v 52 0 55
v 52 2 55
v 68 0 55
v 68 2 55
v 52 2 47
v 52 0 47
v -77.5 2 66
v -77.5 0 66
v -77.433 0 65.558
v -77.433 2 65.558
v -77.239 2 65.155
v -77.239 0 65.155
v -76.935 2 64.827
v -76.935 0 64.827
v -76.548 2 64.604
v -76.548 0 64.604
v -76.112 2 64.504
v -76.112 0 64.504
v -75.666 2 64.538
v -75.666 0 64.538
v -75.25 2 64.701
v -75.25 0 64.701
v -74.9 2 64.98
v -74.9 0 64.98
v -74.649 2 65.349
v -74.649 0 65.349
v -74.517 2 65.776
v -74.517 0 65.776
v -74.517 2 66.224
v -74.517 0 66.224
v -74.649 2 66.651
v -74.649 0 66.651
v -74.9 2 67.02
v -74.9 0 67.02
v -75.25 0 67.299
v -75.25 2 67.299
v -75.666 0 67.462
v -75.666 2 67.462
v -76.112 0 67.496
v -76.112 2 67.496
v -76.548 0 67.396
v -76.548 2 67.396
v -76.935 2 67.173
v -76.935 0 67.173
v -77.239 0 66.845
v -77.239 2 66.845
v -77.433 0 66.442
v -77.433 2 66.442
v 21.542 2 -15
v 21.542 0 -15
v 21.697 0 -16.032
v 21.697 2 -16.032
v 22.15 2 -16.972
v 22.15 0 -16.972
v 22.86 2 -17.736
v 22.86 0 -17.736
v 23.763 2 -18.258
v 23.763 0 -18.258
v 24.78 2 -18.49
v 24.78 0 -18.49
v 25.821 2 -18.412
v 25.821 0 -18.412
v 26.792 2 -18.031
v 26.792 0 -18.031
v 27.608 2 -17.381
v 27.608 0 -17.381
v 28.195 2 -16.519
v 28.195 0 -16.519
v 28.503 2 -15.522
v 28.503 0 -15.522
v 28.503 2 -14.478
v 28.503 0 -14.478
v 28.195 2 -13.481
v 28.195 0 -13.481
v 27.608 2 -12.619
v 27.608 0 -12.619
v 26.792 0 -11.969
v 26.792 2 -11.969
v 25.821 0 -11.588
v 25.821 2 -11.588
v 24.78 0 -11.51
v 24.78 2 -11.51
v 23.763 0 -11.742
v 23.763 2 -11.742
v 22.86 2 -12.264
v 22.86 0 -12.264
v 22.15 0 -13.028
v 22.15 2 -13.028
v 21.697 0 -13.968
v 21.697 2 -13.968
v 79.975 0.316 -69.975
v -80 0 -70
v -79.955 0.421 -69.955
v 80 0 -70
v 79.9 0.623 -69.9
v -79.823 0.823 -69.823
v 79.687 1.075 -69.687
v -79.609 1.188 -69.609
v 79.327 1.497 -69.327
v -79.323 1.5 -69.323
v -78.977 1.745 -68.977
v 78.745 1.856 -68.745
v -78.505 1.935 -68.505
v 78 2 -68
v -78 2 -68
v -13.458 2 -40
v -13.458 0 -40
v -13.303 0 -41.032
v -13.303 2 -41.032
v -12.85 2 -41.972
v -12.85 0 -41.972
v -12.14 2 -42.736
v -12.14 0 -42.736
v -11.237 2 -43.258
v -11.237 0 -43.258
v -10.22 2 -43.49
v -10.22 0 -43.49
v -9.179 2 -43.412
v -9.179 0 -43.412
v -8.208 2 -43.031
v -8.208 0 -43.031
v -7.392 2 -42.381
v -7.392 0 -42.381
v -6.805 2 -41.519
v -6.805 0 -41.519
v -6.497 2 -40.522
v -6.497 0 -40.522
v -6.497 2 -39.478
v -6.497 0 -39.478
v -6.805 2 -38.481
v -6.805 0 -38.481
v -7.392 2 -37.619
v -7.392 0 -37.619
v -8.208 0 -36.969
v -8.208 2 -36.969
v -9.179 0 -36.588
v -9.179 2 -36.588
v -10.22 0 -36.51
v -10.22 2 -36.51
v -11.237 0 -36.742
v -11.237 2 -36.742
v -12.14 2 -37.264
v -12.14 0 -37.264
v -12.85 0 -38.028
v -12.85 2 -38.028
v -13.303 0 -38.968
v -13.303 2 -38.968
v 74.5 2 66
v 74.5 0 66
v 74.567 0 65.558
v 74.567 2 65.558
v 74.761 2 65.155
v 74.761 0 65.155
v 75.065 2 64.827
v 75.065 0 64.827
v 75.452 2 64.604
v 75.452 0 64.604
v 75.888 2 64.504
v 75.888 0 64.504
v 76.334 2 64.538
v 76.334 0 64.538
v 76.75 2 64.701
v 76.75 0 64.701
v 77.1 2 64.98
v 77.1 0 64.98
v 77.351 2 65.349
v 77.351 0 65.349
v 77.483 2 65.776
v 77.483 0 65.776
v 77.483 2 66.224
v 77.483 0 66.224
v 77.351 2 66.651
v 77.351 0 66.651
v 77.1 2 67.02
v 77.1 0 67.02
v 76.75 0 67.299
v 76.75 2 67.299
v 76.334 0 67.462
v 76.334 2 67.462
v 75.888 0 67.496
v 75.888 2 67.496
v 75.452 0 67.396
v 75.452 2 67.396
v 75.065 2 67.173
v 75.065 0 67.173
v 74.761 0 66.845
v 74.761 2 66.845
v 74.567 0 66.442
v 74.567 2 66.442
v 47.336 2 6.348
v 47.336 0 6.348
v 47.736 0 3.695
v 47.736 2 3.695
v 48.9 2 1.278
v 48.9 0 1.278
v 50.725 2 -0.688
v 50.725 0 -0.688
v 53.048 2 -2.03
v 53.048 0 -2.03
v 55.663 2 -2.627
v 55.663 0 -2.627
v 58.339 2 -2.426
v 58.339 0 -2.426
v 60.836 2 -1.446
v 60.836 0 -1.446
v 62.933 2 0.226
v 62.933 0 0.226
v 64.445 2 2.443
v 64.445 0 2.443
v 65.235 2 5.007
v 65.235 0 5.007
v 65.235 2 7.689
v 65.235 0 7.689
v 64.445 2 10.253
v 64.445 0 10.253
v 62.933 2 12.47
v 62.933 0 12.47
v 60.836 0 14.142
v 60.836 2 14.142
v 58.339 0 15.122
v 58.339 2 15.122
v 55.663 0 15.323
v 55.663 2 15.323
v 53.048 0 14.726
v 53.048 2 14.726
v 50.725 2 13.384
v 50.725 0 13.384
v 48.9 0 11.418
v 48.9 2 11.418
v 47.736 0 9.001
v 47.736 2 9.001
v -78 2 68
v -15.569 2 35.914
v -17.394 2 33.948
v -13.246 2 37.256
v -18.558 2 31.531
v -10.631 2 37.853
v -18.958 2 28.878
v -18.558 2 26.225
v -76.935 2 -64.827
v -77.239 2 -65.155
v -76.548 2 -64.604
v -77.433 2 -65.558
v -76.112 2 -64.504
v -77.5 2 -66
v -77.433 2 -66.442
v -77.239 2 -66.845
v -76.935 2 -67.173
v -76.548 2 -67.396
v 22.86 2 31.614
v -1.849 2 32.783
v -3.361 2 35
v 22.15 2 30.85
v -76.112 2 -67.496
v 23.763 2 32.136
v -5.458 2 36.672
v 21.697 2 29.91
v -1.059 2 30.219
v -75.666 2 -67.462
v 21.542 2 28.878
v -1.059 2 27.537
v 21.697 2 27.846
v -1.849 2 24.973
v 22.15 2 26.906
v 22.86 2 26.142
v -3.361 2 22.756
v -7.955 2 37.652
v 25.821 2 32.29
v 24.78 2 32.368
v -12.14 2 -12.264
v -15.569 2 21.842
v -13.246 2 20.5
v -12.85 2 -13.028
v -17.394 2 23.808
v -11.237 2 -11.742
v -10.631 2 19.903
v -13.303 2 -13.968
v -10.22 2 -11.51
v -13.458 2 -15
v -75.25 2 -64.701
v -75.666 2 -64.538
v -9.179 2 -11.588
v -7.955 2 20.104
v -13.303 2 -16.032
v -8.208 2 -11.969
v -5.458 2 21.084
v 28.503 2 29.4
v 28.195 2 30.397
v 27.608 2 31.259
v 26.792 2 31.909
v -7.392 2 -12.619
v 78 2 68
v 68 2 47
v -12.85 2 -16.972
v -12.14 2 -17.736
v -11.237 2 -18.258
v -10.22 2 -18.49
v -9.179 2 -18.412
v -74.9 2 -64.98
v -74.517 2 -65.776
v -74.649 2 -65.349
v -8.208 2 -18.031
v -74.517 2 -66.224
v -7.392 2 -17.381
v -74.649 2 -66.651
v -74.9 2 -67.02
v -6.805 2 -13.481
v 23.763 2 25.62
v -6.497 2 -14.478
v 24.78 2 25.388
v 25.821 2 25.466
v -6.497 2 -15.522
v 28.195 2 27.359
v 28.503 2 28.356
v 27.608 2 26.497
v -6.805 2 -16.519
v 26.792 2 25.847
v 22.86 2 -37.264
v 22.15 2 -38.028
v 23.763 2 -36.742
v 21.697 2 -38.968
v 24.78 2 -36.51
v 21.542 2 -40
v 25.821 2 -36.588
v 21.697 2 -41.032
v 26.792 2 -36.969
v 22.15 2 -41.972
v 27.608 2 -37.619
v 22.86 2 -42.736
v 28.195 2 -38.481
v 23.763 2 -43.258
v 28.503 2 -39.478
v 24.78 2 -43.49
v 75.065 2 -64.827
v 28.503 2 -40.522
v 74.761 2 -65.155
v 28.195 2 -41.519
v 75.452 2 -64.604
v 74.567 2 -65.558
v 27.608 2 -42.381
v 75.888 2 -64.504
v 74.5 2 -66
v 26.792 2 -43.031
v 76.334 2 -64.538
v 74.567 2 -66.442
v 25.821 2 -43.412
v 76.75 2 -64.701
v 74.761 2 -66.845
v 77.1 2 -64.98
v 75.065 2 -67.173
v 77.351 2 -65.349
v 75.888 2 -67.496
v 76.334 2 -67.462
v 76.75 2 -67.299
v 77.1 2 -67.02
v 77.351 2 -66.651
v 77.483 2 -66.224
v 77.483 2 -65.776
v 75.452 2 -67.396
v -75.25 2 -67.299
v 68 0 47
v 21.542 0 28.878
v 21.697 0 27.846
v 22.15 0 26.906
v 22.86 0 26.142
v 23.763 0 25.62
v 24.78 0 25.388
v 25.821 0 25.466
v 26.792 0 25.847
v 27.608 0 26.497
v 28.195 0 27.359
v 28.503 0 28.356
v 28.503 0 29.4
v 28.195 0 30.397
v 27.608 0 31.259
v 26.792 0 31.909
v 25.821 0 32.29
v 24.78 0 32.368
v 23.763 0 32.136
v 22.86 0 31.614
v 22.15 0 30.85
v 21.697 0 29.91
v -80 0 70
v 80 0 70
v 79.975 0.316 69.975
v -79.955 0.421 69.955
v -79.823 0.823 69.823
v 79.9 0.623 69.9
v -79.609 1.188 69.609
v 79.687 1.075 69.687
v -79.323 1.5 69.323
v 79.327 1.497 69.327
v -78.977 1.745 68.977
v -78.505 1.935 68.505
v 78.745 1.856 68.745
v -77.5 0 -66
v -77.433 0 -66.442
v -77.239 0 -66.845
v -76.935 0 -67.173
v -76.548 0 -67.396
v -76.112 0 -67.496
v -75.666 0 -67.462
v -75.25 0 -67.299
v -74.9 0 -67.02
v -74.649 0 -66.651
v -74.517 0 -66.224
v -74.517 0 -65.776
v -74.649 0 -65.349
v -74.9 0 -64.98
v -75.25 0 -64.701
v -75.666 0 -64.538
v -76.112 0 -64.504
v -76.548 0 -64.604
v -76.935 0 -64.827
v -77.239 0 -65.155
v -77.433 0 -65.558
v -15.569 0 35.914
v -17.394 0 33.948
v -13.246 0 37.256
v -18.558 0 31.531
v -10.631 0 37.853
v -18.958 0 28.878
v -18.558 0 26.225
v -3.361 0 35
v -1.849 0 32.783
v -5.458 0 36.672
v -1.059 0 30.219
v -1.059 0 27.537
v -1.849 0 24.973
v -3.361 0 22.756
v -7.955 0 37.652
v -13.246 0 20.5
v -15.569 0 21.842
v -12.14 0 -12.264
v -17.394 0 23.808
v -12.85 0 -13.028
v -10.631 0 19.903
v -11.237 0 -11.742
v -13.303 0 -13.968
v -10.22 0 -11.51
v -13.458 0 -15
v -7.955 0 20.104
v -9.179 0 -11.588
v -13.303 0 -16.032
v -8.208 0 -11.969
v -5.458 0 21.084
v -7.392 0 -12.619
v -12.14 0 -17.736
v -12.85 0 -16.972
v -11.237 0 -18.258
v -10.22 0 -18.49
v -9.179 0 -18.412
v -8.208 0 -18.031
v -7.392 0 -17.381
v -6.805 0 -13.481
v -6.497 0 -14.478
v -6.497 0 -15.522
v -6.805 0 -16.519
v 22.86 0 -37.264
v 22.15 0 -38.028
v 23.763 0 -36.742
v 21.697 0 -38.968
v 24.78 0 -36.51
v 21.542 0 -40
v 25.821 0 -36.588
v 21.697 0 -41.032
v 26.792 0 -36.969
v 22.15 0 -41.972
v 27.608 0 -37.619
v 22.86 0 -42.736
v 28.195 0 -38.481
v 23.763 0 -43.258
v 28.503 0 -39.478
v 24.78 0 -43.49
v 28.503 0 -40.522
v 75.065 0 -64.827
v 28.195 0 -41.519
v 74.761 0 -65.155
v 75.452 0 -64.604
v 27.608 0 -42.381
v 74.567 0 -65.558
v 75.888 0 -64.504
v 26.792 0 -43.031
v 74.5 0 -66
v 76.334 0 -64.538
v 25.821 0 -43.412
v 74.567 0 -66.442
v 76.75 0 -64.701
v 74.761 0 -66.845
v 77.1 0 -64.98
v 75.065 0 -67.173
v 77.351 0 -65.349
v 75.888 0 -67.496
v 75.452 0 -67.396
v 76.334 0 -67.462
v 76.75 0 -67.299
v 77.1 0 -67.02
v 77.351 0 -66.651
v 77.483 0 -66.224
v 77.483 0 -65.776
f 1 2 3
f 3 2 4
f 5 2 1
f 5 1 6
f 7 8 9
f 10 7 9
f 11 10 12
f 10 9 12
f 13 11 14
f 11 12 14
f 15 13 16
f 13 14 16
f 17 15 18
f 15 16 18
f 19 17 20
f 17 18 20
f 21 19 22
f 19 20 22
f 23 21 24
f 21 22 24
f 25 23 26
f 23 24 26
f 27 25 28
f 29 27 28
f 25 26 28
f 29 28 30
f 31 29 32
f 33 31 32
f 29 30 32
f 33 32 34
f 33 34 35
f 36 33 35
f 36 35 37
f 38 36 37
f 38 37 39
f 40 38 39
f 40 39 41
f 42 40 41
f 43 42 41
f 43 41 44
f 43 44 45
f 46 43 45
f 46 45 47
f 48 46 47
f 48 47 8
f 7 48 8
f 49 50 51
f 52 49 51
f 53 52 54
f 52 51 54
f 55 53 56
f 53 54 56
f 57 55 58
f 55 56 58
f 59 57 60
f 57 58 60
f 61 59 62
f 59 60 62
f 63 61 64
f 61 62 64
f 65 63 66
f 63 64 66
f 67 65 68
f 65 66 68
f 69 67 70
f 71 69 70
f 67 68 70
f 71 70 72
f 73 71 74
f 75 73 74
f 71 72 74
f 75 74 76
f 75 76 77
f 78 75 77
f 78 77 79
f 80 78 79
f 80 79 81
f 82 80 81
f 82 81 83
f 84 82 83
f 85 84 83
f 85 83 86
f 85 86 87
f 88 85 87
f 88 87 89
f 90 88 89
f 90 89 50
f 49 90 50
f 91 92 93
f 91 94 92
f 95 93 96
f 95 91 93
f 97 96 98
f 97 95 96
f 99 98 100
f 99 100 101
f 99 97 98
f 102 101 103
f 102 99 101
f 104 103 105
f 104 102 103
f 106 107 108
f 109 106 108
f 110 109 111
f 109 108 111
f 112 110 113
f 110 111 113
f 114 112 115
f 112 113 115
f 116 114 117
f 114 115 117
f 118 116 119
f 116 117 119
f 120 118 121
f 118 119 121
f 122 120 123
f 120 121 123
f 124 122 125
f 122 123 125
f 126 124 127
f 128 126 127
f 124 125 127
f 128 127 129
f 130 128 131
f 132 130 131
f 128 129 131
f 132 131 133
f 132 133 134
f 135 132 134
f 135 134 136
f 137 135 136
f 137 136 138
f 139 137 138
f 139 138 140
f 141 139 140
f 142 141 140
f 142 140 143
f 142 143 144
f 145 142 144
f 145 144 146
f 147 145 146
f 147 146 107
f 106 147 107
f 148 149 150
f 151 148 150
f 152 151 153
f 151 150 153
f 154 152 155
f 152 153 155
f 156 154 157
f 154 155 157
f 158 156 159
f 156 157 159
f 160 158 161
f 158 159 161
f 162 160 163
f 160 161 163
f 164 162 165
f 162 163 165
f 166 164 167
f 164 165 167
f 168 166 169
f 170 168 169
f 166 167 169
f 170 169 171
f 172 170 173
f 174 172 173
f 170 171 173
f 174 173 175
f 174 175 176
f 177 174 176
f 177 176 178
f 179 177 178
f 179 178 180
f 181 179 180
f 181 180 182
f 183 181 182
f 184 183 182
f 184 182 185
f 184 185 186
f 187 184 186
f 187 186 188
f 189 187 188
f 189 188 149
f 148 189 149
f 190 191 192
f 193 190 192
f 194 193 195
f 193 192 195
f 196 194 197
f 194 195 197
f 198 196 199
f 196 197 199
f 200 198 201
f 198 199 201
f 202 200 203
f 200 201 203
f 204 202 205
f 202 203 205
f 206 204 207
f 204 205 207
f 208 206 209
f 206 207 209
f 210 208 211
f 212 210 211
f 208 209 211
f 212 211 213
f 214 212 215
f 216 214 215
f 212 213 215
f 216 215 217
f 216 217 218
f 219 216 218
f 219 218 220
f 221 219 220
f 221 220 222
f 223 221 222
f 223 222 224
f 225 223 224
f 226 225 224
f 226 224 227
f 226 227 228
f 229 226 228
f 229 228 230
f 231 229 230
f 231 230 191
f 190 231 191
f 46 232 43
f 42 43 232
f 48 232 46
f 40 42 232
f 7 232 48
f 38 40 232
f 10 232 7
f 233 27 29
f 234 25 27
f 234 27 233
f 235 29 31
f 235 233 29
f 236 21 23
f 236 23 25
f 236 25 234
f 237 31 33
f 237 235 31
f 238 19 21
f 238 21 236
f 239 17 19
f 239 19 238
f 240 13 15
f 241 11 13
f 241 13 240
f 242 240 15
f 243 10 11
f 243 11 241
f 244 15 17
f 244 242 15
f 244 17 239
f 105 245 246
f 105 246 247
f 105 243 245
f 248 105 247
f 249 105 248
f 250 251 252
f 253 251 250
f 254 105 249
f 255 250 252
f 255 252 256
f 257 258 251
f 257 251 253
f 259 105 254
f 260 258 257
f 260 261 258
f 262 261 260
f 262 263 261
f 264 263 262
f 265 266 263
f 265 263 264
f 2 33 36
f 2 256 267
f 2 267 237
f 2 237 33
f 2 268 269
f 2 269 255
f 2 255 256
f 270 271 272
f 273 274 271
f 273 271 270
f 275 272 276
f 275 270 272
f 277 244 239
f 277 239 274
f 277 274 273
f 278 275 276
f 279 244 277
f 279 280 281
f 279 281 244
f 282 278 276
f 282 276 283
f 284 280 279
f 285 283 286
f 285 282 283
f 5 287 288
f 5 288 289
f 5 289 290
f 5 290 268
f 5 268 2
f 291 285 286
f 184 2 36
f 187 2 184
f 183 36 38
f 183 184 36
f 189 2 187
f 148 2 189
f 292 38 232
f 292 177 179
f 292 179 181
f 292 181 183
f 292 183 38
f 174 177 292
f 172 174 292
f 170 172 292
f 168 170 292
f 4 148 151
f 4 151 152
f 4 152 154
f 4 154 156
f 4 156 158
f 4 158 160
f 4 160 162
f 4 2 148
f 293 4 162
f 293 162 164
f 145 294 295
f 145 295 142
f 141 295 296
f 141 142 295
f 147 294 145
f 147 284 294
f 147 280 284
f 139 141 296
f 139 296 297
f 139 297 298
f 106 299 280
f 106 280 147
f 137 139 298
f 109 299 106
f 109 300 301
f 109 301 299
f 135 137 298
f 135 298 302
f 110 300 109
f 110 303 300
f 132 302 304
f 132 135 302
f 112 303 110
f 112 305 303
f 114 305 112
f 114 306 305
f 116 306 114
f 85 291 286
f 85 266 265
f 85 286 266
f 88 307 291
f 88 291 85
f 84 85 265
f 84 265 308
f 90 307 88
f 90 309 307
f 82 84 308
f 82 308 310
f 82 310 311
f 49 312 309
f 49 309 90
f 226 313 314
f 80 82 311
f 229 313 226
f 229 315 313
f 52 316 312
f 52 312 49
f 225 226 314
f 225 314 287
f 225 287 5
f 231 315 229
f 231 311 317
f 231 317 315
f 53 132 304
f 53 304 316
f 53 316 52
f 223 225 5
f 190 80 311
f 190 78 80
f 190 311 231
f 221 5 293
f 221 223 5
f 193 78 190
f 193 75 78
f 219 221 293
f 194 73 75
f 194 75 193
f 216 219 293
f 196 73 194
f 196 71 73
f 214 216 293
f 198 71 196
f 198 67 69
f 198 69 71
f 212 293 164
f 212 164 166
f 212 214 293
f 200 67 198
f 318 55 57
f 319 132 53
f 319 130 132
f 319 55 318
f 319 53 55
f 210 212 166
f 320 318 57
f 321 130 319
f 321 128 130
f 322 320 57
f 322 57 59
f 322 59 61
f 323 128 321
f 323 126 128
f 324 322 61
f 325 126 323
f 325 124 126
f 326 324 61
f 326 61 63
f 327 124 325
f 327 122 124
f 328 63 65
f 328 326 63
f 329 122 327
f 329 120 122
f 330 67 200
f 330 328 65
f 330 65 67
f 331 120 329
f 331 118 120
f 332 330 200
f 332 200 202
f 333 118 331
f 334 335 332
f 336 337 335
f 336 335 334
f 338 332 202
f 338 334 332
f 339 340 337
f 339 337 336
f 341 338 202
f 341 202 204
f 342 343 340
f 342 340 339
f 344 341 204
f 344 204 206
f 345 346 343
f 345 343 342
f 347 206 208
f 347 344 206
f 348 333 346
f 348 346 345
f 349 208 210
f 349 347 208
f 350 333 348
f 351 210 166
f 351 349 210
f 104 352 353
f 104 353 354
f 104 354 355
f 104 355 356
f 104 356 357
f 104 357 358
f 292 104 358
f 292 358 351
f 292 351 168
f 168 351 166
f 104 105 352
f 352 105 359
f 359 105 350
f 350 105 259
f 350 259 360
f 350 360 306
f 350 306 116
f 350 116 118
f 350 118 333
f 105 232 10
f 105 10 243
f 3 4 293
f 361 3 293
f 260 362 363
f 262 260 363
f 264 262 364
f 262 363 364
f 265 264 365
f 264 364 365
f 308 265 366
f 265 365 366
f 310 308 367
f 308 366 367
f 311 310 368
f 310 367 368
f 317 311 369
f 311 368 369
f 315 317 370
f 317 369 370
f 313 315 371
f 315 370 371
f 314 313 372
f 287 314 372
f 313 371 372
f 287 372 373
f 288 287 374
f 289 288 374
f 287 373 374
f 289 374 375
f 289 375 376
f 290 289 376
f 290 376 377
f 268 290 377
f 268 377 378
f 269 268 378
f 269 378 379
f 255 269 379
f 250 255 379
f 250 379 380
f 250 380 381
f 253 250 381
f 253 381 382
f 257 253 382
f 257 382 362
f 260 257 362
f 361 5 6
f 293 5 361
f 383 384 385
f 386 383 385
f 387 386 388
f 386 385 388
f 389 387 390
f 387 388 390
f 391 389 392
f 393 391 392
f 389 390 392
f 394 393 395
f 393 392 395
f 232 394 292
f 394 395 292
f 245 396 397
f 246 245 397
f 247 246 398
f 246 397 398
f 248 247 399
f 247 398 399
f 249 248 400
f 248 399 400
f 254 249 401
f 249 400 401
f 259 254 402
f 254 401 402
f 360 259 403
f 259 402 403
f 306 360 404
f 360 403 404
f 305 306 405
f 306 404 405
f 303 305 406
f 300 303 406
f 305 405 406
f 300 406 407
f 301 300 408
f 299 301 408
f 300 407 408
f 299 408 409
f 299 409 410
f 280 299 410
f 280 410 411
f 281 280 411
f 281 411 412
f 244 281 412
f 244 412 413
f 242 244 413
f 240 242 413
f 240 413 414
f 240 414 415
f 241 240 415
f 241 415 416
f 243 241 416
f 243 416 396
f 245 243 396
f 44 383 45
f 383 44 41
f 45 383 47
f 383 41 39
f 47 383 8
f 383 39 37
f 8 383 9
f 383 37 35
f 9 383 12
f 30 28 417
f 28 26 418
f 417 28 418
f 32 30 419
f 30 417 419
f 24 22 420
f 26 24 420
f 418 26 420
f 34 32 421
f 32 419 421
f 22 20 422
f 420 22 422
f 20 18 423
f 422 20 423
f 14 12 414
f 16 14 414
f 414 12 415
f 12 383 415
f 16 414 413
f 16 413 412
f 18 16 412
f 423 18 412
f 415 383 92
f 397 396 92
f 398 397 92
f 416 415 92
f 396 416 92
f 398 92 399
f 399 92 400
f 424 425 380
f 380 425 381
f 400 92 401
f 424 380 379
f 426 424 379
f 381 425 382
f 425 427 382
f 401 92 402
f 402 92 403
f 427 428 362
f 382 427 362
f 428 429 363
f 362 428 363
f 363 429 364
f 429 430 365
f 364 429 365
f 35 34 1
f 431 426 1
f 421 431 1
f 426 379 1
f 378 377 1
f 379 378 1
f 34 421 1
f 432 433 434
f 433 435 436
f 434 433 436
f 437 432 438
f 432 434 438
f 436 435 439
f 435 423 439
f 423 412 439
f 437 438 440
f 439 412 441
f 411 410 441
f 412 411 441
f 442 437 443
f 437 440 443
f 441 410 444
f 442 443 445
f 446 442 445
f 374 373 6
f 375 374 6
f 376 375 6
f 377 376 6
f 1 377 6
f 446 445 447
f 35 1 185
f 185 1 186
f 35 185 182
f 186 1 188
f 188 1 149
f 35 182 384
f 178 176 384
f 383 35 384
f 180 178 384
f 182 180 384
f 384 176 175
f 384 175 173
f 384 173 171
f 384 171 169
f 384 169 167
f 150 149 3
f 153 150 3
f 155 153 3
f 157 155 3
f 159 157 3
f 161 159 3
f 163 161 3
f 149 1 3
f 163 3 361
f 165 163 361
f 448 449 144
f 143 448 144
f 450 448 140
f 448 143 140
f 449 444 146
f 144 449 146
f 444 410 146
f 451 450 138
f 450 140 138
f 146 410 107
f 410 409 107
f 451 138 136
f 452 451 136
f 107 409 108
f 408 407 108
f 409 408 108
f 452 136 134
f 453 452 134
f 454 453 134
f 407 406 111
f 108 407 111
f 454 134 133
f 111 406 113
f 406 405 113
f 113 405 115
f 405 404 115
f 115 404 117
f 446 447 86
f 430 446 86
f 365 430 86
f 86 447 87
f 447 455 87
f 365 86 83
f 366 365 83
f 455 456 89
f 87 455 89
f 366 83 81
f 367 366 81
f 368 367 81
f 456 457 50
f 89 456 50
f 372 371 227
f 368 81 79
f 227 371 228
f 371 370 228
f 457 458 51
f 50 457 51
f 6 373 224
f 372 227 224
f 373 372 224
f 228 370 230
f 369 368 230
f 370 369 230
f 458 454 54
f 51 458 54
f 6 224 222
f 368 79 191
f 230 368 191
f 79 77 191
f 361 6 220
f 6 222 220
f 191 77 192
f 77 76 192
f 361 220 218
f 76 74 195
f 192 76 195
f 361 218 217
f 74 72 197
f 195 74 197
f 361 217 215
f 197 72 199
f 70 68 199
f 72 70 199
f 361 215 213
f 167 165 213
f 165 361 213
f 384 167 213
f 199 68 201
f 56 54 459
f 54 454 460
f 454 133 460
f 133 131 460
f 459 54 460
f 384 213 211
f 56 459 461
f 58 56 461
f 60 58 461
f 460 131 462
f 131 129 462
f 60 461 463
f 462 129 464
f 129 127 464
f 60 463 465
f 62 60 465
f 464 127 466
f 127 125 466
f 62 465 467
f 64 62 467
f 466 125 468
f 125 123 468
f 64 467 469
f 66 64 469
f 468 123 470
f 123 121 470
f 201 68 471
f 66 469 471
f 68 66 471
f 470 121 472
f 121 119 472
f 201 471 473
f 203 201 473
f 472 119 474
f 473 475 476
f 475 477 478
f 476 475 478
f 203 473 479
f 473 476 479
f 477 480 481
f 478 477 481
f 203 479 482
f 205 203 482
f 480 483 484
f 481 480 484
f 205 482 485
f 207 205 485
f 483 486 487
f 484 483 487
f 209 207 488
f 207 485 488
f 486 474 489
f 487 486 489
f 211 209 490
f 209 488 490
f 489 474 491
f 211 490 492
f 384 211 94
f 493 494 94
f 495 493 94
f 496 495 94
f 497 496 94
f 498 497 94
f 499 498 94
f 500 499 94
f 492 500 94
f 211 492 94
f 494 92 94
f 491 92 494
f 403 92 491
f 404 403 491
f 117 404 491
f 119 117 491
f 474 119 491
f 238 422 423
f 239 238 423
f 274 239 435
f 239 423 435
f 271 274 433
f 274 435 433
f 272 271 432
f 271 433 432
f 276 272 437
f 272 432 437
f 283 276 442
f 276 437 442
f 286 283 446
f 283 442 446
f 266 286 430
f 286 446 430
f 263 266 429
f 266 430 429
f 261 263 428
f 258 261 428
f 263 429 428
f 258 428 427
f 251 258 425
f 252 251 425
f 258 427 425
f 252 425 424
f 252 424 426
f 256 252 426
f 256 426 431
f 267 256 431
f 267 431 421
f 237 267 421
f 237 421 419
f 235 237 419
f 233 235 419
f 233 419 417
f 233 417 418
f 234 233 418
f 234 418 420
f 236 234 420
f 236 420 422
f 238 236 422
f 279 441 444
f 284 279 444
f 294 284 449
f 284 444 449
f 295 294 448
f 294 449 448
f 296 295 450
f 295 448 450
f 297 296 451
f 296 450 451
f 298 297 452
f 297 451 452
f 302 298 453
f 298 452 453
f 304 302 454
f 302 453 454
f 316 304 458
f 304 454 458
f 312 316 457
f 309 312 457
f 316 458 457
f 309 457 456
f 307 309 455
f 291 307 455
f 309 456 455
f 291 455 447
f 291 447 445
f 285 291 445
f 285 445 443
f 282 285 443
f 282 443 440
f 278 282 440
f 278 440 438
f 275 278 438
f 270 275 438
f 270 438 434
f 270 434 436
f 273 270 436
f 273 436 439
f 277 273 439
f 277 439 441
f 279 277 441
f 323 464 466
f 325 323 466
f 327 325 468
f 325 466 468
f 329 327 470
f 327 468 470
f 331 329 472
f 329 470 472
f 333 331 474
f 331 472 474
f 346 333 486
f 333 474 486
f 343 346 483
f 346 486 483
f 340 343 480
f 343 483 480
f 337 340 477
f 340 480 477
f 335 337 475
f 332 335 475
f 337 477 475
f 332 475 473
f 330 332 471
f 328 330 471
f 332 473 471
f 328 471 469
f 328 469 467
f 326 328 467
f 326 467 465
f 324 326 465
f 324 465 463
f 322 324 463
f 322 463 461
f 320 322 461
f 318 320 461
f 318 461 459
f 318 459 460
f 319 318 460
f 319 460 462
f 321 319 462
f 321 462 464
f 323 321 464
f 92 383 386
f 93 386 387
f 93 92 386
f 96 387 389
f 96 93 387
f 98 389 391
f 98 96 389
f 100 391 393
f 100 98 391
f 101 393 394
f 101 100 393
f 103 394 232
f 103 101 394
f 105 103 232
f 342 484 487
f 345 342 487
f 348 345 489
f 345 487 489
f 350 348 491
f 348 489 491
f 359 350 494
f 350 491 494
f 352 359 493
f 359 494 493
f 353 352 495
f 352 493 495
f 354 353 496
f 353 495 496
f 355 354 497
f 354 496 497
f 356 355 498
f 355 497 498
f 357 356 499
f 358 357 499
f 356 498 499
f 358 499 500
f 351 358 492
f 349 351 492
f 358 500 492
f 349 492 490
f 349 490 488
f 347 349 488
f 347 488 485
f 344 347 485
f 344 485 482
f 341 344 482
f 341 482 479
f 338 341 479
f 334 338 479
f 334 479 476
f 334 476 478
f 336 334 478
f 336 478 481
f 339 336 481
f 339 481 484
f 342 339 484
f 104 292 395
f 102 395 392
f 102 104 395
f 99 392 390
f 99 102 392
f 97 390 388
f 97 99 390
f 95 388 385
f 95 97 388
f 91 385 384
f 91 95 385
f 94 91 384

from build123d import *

# Parameters (mm, degrees)
SKETCH1_W             = 160
SKETCH1_H             = 140
BOSS_EXTRUDE1_DEPTH   = 2
F_3_0MM_DOWEL_HOLE1_D = 3
F_1_5MM_DOWEL_HOLE4_D = 18
F_3_0MM_DOWEL_HOLE2_D = 7
FILLET2_R             = 2
SKETCH22_W            = 16
SKETCH22_H            = 8
CUT_EXTRUDE1_DEPTH    = 2


with BuildPart() as part:
    # Sketch1 → Boss-Extrude1 (new body)
    with BuildSketch(Plane(origin=(0, 0, 0), x_dir=(1, 0, 0), z_dir=(0, 1, 0))):
        Rectangle(SKETCH1_W, SKETCH1_H)
    extrude(amount=BOSS_EXTRUDE1_DEPTH)

    # Ø3.0mm Dowel Hole1 (through all)
    with Locations(Plane(origin=(0, 2, 0), x_dir=(1, 0, 0), z_dir=(0, 1, 0))):
        with Locations((-76, 66), (76, 66), (76, -66), (-76, -66)):
            Hole(F_3_0MM_DOWEL_HOLE1_D / 2)

    # Ø1.5mm Dowel Hole4 (through all)
    with Locations(Plane(origin=(0, 2, 0), x_dir=(1, 0, 0), z_dir=(0, 1, 0))):
        with Locations((56.336, -6.348), (-9.958, -28.878)):
            Hole(F_1_5MM_DOWEL_HOLE4_D / 2)

    # Ø3.0mm Dowel Hole2 (through all)
    with Locations(Plane(origin=(0, 2, 0), x_dir=(1, 0, 0), z_dir=(0, 1, 0))):
        with Locations((-9.958, 40), (25.042, 40), (-9.958, 15), (25.042, 15), (25.042, -28.878)):
            Hole(F_3_0MM_DOWEL_HOLE2_D / 2)

    # Fillet2
    fillet2_edges = [part.edges().sort_by_distance(p)[0] for p in [
        (80, 2, 0),
        (0, 2, -70),
        (-80, 2, 0),
        (0, 2, 70),
    ]]
    fillet(fillet2_edges, radius=FILLET2_R - 0.0001)  # a hair under: the kernel refuses the full size

    # Sketch22 → Cut-Extrude1 (cut)
    with BuildSketch(Plane(origin=(0, 2, 0), x_dir=(1, 0, 0), z_dir=(0, 1, 0))):
        with Locations((60, -51)):
            Rectangle(SKETCH22_W, SKETCH22_H)
    extrude(amount=-CUT_EXTRUDE1_DEPTH, mode=Mode.SUBTRACT)


solid = part.part
